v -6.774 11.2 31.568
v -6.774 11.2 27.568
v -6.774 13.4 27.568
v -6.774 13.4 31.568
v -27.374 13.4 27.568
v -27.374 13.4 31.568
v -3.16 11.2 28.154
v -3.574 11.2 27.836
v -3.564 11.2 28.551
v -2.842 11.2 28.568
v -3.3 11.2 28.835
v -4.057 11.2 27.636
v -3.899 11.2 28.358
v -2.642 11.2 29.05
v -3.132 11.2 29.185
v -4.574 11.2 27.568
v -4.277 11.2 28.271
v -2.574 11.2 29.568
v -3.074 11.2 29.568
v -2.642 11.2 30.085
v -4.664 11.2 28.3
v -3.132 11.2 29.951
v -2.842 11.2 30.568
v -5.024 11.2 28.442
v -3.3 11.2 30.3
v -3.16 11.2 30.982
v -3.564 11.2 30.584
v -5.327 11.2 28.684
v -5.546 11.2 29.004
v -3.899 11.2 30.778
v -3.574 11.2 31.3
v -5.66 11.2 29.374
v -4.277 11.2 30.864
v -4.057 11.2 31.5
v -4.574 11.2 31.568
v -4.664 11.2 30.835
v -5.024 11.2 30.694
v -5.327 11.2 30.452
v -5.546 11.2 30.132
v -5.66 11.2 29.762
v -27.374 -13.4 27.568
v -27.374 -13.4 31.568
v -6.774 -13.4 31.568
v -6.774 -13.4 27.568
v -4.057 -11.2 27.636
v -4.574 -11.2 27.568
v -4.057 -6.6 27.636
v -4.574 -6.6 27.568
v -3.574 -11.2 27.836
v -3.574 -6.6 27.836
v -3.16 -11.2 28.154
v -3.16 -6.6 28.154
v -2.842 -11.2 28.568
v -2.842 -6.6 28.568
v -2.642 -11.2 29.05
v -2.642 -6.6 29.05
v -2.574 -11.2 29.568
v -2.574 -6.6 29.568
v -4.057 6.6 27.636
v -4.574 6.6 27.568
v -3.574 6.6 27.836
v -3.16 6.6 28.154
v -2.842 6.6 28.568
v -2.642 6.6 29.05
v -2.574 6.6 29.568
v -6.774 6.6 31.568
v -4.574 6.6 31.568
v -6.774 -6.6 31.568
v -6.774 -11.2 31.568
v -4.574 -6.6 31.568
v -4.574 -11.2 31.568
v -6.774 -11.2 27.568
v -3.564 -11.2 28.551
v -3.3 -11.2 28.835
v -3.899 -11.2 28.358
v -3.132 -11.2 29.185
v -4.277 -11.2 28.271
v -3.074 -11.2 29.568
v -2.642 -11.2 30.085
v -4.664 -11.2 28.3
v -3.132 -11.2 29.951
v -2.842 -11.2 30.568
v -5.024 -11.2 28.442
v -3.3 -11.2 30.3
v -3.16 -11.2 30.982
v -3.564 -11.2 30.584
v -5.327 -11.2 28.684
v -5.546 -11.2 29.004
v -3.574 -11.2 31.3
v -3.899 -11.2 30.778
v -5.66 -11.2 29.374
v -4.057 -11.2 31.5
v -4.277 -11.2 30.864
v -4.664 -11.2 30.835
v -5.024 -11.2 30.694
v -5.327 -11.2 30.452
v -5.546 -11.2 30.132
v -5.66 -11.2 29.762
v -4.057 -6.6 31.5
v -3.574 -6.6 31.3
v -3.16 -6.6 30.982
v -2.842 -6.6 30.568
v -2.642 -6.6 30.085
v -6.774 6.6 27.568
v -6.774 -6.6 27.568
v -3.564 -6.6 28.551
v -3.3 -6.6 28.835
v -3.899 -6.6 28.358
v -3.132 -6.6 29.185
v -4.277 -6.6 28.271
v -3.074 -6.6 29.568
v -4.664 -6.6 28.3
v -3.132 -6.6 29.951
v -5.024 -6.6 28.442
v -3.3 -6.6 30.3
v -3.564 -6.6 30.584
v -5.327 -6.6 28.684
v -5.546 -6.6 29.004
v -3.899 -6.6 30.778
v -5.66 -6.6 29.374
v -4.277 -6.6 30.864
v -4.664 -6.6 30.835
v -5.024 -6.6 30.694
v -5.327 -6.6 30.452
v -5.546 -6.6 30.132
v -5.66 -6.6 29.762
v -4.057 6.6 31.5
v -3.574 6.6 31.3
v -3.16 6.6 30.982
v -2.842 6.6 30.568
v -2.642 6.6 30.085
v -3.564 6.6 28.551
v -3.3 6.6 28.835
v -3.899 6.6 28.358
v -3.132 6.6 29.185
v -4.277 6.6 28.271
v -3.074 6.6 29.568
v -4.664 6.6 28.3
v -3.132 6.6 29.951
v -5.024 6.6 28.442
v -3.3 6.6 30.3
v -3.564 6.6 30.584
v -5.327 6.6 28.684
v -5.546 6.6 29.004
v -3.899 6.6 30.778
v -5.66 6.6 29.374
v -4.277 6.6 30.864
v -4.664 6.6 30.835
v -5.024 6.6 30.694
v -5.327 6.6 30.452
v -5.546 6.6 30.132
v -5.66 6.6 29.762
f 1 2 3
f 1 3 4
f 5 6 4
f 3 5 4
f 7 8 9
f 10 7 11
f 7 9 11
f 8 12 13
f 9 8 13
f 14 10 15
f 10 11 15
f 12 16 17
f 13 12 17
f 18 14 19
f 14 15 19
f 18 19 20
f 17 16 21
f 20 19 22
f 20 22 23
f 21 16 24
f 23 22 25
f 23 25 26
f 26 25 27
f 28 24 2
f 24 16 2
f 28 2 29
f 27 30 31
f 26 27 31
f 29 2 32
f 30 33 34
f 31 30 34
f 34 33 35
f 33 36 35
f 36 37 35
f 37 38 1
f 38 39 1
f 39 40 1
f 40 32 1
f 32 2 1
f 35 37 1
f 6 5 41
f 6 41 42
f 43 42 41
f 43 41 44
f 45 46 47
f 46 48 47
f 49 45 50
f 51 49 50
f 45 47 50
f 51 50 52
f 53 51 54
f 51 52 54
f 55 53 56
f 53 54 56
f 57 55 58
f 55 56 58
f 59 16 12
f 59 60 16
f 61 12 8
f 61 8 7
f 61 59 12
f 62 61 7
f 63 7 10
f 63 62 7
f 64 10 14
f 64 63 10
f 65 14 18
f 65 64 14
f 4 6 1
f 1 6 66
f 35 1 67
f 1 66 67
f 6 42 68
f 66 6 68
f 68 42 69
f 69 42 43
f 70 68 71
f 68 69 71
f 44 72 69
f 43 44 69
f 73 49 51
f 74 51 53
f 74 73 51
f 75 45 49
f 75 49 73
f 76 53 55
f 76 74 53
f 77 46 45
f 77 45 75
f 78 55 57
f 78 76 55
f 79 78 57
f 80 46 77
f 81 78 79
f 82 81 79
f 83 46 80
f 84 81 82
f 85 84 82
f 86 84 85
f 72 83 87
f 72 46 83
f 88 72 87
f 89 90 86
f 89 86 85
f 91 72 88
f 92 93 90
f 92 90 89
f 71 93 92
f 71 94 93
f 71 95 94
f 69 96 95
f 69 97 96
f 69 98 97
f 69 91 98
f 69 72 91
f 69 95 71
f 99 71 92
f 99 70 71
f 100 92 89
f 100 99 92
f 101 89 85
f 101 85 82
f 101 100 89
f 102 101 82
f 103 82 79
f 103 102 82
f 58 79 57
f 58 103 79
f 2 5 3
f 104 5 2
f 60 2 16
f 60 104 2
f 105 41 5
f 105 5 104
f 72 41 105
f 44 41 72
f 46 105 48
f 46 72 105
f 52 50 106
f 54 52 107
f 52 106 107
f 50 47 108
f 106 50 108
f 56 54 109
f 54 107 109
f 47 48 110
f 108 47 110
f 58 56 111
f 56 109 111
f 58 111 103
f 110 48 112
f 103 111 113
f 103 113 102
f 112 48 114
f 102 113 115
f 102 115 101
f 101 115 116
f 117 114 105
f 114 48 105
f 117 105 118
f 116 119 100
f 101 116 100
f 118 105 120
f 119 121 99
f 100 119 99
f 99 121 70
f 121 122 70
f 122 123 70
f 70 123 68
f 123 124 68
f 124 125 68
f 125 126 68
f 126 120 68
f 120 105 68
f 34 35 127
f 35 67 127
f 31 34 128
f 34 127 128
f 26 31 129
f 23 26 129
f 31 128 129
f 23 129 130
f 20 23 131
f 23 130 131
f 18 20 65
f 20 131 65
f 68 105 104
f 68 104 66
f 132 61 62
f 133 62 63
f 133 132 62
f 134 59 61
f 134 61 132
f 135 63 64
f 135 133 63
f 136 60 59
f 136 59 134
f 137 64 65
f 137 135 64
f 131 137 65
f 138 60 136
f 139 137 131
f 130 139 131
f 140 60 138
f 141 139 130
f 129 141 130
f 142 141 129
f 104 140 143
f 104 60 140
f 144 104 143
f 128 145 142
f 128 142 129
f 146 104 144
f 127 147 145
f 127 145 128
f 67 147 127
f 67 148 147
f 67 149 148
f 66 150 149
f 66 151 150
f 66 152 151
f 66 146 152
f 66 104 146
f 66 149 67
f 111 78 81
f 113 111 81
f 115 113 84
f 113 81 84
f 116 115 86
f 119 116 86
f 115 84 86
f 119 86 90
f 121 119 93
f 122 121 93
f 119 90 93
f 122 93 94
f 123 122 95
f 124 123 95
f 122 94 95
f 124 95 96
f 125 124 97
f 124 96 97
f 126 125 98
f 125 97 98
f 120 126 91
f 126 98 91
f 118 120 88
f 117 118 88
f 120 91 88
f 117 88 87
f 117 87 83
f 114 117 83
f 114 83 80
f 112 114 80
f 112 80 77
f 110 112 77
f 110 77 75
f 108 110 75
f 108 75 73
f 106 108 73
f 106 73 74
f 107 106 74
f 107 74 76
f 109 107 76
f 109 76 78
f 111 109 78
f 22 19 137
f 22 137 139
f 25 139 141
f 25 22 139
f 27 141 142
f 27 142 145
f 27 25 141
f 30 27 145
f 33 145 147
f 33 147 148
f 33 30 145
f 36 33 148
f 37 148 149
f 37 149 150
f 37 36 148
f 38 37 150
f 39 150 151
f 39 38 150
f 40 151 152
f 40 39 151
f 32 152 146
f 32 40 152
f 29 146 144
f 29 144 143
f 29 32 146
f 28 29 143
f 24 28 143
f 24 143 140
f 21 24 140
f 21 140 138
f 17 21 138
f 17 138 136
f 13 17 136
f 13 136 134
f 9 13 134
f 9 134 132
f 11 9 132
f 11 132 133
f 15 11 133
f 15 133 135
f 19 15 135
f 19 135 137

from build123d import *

# Parameters (mm, degrees)
F0_W     = 20.6
F0_H     = 4
F1_DEPTH = 13.4
F2_W     = 4.6
F2_H     = 4
F3_DEPTH = 4.2
F4_R     = 1.3
F5_DEPTH = 25
F6_R     = 1.99999


# Not quite as in the source:
# - a fillet or chamfer is up to 0.001 mm smaller than in the source, because OpenCascade refuses the exact size


with BuildPart() as f1:
    # F0 (on Front) → F1 (new body)
    with BuildSketch(Plane.XZ):
        with Locations((-17.0743378759, 29.5677930117)):
            Rectangle(F0_W, F0_H)
    extrude(amount=F1_DEPTH)

    # F2 (on face) → F3 (join)
    with BuildSketch(Plane.YZ.offset(-6.7743378759)):
        with Locations((-8.9, 29.5677930117)):
            Rectangle(F2_W, F2_H)
    extrude(amount=F3_DEPTH)

    # F4 (on face) → F5 (cut)
    with BuildSketch(Plane.XZ.offset(11.2)):
        with Locations((-4.3743378759, 29.5677930117)):
            Circle(F4_R)
    extrude(amount=-F5_DEPTH, mode=Mode.SUBTRACT)

    # F6 (radius 2 in the source; OpenCascade refuses exactly that, so slightly less here)
    f6_edges = [f1.edges().sort_by_distance(p)[0] for p in [
        (-2.574338, -8.9, 31.567793),
        (-2.574338, -8.9, 27.567793),
    ]]
    fillet(f6_edges, radius=F6_R)

    # F7: F1 across face


with BuildPart() as f1_1:
    add(f1.part)
    add(f1.part.mirror(Plane(origin=(-17.0743378759, 0, 29.5677930117), x_dir=(1, 0, 0), z_dir=(0, 1, 0))))


solid = f1_1.part
